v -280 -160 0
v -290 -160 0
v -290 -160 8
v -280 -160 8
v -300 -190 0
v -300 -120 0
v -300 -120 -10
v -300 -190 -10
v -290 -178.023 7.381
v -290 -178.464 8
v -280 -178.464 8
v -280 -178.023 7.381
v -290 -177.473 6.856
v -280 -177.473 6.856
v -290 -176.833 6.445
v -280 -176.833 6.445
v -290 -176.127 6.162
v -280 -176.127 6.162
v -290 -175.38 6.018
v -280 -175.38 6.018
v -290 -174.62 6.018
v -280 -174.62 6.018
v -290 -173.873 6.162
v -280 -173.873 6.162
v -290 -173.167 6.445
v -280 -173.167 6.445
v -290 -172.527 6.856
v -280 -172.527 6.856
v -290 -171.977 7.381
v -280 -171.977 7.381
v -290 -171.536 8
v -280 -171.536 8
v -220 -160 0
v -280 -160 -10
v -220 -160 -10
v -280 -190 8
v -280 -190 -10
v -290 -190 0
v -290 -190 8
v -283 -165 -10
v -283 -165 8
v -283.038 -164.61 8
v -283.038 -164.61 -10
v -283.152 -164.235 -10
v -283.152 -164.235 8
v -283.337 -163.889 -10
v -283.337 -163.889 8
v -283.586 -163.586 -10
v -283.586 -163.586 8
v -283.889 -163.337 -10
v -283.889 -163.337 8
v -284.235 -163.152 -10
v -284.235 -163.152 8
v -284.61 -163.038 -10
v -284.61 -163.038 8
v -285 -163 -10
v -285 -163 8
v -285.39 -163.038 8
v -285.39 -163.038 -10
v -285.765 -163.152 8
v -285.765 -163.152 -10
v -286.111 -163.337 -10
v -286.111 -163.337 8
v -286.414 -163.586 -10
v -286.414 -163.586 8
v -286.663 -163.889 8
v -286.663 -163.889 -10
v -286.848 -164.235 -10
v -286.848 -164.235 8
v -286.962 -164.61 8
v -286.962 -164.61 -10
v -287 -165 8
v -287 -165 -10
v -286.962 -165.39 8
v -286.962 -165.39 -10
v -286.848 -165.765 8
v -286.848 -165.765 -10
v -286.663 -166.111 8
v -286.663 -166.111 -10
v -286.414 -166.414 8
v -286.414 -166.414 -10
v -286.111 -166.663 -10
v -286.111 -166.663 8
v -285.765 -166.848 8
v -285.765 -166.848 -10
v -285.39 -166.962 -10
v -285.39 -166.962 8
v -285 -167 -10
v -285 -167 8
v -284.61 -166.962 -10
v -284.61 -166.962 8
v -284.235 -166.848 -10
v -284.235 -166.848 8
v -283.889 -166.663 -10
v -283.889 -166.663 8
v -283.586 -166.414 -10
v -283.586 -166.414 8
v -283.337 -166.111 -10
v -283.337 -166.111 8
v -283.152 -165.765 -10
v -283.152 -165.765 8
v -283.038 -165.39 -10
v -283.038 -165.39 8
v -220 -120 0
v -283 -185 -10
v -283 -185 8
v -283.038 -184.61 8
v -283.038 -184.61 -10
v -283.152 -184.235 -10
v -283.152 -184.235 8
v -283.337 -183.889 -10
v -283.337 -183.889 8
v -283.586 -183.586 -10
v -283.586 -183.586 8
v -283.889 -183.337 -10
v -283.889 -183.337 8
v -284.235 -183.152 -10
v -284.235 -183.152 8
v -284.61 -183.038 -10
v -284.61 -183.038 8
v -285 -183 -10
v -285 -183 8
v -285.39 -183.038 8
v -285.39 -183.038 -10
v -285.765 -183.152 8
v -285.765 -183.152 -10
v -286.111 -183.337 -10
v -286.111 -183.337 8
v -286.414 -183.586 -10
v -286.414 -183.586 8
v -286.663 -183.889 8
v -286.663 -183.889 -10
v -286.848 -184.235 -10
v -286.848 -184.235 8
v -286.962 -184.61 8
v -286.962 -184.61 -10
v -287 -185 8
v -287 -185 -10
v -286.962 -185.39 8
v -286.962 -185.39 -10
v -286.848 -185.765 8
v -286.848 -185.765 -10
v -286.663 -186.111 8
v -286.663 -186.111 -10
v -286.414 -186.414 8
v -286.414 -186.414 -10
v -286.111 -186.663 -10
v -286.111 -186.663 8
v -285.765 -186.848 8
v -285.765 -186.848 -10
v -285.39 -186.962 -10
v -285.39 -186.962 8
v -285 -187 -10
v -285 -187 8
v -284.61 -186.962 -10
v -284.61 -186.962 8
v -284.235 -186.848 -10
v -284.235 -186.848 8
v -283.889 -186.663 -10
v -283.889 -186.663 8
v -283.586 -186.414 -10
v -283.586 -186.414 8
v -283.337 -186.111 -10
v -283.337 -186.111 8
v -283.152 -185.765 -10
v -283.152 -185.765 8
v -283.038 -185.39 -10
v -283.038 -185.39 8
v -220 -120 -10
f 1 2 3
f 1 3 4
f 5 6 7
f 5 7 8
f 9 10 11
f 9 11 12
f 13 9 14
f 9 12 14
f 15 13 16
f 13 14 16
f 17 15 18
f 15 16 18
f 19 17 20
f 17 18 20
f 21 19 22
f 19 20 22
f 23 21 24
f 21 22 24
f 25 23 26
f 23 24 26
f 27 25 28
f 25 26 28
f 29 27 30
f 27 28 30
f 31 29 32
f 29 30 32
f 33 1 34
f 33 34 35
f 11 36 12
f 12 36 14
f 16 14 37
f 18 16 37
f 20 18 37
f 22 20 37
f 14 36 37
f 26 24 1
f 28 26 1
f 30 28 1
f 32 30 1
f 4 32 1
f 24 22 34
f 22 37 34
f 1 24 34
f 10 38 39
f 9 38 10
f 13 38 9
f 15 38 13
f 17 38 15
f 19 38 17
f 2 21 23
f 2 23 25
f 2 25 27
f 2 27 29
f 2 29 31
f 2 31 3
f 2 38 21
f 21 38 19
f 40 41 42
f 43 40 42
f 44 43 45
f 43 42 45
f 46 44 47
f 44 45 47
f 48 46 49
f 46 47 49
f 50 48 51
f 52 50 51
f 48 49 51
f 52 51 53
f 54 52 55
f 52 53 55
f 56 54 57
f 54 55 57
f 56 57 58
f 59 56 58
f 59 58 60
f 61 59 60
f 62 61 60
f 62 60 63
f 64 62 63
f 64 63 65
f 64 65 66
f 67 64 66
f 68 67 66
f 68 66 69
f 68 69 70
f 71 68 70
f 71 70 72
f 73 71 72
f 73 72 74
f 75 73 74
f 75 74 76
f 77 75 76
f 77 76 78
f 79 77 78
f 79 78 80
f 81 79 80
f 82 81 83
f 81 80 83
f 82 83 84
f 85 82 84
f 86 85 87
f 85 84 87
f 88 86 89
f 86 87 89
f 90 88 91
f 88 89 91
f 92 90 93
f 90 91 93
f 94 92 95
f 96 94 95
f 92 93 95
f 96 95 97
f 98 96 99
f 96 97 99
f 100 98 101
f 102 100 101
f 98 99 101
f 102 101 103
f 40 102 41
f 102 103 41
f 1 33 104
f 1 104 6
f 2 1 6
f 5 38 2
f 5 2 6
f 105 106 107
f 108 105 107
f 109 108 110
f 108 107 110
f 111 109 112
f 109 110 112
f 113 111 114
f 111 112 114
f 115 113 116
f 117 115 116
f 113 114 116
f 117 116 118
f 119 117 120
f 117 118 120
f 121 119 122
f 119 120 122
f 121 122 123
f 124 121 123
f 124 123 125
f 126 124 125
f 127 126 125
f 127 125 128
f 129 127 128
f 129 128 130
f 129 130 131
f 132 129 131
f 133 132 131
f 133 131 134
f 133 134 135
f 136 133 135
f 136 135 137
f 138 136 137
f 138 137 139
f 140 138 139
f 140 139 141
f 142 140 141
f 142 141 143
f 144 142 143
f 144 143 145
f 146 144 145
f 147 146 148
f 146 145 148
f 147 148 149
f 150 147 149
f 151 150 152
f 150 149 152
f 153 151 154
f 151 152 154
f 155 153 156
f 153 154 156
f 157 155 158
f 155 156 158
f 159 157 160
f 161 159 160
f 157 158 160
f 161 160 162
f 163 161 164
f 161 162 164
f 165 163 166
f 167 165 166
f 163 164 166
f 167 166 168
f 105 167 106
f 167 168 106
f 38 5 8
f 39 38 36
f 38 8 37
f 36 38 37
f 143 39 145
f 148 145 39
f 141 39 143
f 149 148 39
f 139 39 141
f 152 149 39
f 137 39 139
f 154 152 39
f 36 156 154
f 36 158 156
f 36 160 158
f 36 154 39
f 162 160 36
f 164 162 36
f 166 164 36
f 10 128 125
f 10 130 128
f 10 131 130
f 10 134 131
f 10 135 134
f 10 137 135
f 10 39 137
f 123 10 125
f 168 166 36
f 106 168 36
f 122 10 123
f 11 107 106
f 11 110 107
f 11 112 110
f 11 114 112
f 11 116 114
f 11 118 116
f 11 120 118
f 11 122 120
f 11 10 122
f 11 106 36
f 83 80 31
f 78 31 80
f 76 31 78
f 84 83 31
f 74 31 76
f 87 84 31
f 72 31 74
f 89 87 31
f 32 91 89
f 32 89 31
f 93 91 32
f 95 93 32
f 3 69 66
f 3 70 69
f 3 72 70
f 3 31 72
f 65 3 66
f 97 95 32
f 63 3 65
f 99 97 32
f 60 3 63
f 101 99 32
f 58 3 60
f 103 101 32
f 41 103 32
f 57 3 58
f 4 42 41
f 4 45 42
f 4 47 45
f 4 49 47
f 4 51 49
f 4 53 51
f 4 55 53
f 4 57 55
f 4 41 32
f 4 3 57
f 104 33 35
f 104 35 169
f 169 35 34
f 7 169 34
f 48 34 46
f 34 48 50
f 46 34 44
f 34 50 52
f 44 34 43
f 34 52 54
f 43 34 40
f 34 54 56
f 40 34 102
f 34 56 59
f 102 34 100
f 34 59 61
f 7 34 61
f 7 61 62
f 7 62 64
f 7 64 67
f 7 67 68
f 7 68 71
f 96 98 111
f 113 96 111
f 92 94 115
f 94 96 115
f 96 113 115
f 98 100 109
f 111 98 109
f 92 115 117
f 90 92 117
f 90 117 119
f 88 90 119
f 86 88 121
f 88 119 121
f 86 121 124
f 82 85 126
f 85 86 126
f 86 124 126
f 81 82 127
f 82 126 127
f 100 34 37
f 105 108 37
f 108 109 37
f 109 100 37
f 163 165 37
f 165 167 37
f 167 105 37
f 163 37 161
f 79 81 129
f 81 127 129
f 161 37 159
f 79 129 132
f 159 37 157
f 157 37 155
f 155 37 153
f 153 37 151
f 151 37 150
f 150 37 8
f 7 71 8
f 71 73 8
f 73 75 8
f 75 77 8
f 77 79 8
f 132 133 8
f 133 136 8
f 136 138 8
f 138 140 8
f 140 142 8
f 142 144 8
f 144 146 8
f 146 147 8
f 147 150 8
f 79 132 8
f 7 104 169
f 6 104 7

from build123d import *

# Parameters (mm, degrees)
PAD001_DEPTH    = 10
SKETCH002_W     = 10
SKETCH002_H     = 30
PAD002_DEPTH    = 8
SKETCH003_R     = 4
POCKET_DEPTH    = 10
SKETCH004_R     = 2
POCKET001_DEPTH = 20
SKETCH005_R     = 2
POCKET002_DEPTH = 20


with BuildPart() as part:
    # Sketch001 → Pad001 (new body)
    with BuildSketch(Plane(origin=(0, 0, 0), x_dir=(1, 0, 0), z_dir=(0, 0, -1))):
        Polygon((-300, 190), (-280, 190), (-280, 160), (-220, 160), (-220, 120), (-300, 120), align=None)
    extrude(amount=PAD001_DEPTH)

    # Sketch002 → Pad002 (new body)
    with BuildSketch(Plane.XY):
        with Locations((-285, -175)):
            Rectangle(SKETCH002_W, SKETCH002_H)
    extrude(amount=PAD002_DEPTH)

    # Sketch003 → Pocket (cut)
    with BuildSketch(Plane.YZ.offset(-280)):
        with Locations((-175, 10)):
            Circle(SKETCH003_R)
    extrude(amount=-POCKET_DEPTH, mode=Mode.SUBTRACT)

    # Sketch004 → Pocket001 (cut)
    with BuildSketch(Plane.XY.offset(8)):
        with Locations((-285, -185)):
            Circle(SKETCH004_R)
    extrude(amount=-POCKET001_DEPTH, mode=Mode.SUBTRACT)

    # Sketch005 → Pocket002 (cut)
    with BuildSketch(Plane.XY.offset(8)):
        with Locations((-285, -165)):
            Circle(SKETCH005_R)
    extrude(amount=-POCKET002_DEPTH, mode=Mode.SUBTRACT)


solid = part.part
